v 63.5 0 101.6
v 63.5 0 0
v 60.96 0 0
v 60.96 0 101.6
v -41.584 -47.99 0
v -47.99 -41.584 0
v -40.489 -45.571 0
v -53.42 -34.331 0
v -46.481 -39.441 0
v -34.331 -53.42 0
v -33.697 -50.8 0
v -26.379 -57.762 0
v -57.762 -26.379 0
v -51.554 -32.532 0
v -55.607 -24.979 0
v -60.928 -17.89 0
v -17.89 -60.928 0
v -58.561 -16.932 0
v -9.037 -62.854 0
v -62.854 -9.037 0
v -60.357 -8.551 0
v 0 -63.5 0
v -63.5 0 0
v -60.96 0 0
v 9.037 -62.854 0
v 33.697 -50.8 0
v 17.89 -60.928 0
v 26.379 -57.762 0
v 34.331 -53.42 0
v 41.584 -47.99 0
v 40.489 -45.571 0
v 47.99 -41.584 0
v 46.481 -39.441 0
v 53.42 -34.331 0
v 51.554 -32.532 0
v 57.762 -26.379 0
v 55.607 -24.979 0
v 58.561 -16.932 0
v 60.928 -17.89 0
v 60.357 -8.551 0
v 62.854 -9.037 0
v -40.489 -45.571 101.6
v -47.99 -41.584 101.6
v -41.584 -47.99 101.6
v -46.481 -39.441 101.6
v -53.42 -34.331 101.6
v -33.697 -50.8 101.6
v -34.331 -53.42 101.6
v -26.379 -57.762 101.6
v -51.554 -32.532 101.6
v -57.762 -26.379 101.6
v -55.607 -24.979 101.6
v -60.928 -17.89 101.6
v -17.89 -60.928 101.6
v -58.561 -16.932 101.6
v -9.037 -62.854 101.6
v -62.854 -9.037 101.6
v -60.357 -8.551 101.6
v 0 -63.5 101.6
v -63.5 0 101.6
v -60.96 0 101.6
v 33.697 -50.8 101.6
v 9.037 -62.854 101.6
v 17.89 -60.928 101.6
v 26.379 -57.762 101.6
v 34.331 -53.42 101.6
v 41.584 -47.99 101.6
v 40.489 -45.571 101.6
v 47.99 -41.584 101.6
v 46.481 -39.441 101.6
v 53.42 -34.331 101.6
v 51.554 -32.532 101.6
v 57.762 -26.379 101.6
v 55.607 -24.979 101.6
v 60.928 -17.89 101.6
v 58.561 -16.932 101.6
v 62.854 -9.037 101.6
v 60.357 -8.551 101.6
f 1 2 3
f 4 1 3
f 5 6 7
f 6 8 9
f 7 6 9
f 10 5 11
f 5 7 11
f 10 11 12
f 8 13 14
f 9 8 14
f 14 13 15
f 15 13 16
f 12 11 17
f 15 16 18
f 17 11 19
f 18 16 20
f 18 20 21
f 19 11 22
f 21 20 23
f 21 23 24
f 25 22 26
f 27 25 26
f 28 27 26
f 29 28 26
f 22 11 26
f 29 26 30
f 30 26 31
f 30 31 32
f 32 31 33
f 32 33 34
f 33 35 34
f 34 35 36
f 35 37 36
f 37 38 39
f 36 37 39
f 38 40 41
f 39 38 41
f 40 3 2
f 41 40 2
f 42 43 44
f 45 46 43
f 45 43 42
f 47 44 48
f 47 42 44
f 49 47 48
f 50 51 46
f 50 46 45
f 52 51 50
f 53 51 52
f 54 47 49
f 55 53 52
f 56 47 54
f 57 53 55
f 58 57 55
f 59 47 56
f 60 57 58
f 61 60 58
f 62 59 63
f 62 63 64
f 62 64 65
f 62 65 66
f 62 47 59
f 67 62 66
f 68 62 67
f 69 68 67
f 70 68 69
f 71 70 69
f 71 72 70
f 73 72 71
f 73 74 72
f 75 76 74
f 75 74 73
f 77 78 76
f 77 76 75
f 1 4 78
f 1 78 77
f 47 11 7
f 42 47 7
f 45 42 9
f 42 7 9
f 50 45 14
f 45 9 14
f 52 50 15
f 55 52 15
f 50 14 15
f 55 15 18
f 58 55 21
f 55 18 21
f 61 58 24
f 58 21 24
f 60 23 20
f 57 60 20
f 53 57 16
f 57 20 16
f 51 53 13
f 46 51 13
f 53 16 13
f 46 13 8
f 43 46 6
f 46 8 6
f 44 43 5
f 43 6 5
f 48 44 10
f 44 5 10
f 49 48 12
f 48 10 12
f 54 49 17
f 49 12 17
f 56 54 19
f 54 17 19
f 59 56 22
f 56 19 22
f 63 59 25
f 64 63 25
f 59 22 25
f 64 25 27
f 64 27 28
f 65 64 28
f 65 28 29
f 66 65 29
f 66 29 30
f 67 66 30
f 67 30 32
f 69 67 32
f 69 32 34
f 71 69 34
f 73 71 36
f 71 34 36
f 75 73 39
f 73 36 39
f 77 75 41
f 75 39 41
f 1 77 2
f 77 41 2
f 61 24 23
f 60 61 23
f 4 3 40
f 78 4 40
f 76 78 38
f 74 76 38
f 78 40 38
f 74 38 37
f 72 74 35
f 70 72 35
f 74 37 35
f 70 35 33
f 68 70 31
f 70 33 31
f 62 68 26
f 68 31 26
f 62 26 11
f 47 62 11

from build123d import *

# Parameters (mm, degrees)
BOSS_EXTRUDE3_DEPTH = 101.6


with BuildPart() as part:
    # Sketch3 → Boss-Extrude3 (new body)
    with BuildSketch(Plane.XY):
        with BuildLine():
            Line((63.5, 0), (60.96, 0))
            ThreePointArc((60.96, 0), (53.713522989, -28.826707202), (33.69690787, -50.8))
            ThreePointArc((33.69690787, -50.8), (0, -60.96), (-33.69690787, -50.8))
            ThreePointArc((-33.69690787, -50.8), (-53.713522989, -28.826707202), (-60.96, 0))
            Line((-60.96, 0), (-63.5, 0))
            ThreePointArc((-63.5, 0), (0, -63.5), (63.5, 0))
        make_face()
        with BuildLine():
            ThreePointArc((-33.69690787, -50.8), (0, -60.96), (33.69690787, -50.8))
            Line((33.69690787, -50.8), (-33.69690787, -50.8))
        make_face()
    extrude(amount=BOSS_EXTRUDE3_DEPTH)


solid = part.part
